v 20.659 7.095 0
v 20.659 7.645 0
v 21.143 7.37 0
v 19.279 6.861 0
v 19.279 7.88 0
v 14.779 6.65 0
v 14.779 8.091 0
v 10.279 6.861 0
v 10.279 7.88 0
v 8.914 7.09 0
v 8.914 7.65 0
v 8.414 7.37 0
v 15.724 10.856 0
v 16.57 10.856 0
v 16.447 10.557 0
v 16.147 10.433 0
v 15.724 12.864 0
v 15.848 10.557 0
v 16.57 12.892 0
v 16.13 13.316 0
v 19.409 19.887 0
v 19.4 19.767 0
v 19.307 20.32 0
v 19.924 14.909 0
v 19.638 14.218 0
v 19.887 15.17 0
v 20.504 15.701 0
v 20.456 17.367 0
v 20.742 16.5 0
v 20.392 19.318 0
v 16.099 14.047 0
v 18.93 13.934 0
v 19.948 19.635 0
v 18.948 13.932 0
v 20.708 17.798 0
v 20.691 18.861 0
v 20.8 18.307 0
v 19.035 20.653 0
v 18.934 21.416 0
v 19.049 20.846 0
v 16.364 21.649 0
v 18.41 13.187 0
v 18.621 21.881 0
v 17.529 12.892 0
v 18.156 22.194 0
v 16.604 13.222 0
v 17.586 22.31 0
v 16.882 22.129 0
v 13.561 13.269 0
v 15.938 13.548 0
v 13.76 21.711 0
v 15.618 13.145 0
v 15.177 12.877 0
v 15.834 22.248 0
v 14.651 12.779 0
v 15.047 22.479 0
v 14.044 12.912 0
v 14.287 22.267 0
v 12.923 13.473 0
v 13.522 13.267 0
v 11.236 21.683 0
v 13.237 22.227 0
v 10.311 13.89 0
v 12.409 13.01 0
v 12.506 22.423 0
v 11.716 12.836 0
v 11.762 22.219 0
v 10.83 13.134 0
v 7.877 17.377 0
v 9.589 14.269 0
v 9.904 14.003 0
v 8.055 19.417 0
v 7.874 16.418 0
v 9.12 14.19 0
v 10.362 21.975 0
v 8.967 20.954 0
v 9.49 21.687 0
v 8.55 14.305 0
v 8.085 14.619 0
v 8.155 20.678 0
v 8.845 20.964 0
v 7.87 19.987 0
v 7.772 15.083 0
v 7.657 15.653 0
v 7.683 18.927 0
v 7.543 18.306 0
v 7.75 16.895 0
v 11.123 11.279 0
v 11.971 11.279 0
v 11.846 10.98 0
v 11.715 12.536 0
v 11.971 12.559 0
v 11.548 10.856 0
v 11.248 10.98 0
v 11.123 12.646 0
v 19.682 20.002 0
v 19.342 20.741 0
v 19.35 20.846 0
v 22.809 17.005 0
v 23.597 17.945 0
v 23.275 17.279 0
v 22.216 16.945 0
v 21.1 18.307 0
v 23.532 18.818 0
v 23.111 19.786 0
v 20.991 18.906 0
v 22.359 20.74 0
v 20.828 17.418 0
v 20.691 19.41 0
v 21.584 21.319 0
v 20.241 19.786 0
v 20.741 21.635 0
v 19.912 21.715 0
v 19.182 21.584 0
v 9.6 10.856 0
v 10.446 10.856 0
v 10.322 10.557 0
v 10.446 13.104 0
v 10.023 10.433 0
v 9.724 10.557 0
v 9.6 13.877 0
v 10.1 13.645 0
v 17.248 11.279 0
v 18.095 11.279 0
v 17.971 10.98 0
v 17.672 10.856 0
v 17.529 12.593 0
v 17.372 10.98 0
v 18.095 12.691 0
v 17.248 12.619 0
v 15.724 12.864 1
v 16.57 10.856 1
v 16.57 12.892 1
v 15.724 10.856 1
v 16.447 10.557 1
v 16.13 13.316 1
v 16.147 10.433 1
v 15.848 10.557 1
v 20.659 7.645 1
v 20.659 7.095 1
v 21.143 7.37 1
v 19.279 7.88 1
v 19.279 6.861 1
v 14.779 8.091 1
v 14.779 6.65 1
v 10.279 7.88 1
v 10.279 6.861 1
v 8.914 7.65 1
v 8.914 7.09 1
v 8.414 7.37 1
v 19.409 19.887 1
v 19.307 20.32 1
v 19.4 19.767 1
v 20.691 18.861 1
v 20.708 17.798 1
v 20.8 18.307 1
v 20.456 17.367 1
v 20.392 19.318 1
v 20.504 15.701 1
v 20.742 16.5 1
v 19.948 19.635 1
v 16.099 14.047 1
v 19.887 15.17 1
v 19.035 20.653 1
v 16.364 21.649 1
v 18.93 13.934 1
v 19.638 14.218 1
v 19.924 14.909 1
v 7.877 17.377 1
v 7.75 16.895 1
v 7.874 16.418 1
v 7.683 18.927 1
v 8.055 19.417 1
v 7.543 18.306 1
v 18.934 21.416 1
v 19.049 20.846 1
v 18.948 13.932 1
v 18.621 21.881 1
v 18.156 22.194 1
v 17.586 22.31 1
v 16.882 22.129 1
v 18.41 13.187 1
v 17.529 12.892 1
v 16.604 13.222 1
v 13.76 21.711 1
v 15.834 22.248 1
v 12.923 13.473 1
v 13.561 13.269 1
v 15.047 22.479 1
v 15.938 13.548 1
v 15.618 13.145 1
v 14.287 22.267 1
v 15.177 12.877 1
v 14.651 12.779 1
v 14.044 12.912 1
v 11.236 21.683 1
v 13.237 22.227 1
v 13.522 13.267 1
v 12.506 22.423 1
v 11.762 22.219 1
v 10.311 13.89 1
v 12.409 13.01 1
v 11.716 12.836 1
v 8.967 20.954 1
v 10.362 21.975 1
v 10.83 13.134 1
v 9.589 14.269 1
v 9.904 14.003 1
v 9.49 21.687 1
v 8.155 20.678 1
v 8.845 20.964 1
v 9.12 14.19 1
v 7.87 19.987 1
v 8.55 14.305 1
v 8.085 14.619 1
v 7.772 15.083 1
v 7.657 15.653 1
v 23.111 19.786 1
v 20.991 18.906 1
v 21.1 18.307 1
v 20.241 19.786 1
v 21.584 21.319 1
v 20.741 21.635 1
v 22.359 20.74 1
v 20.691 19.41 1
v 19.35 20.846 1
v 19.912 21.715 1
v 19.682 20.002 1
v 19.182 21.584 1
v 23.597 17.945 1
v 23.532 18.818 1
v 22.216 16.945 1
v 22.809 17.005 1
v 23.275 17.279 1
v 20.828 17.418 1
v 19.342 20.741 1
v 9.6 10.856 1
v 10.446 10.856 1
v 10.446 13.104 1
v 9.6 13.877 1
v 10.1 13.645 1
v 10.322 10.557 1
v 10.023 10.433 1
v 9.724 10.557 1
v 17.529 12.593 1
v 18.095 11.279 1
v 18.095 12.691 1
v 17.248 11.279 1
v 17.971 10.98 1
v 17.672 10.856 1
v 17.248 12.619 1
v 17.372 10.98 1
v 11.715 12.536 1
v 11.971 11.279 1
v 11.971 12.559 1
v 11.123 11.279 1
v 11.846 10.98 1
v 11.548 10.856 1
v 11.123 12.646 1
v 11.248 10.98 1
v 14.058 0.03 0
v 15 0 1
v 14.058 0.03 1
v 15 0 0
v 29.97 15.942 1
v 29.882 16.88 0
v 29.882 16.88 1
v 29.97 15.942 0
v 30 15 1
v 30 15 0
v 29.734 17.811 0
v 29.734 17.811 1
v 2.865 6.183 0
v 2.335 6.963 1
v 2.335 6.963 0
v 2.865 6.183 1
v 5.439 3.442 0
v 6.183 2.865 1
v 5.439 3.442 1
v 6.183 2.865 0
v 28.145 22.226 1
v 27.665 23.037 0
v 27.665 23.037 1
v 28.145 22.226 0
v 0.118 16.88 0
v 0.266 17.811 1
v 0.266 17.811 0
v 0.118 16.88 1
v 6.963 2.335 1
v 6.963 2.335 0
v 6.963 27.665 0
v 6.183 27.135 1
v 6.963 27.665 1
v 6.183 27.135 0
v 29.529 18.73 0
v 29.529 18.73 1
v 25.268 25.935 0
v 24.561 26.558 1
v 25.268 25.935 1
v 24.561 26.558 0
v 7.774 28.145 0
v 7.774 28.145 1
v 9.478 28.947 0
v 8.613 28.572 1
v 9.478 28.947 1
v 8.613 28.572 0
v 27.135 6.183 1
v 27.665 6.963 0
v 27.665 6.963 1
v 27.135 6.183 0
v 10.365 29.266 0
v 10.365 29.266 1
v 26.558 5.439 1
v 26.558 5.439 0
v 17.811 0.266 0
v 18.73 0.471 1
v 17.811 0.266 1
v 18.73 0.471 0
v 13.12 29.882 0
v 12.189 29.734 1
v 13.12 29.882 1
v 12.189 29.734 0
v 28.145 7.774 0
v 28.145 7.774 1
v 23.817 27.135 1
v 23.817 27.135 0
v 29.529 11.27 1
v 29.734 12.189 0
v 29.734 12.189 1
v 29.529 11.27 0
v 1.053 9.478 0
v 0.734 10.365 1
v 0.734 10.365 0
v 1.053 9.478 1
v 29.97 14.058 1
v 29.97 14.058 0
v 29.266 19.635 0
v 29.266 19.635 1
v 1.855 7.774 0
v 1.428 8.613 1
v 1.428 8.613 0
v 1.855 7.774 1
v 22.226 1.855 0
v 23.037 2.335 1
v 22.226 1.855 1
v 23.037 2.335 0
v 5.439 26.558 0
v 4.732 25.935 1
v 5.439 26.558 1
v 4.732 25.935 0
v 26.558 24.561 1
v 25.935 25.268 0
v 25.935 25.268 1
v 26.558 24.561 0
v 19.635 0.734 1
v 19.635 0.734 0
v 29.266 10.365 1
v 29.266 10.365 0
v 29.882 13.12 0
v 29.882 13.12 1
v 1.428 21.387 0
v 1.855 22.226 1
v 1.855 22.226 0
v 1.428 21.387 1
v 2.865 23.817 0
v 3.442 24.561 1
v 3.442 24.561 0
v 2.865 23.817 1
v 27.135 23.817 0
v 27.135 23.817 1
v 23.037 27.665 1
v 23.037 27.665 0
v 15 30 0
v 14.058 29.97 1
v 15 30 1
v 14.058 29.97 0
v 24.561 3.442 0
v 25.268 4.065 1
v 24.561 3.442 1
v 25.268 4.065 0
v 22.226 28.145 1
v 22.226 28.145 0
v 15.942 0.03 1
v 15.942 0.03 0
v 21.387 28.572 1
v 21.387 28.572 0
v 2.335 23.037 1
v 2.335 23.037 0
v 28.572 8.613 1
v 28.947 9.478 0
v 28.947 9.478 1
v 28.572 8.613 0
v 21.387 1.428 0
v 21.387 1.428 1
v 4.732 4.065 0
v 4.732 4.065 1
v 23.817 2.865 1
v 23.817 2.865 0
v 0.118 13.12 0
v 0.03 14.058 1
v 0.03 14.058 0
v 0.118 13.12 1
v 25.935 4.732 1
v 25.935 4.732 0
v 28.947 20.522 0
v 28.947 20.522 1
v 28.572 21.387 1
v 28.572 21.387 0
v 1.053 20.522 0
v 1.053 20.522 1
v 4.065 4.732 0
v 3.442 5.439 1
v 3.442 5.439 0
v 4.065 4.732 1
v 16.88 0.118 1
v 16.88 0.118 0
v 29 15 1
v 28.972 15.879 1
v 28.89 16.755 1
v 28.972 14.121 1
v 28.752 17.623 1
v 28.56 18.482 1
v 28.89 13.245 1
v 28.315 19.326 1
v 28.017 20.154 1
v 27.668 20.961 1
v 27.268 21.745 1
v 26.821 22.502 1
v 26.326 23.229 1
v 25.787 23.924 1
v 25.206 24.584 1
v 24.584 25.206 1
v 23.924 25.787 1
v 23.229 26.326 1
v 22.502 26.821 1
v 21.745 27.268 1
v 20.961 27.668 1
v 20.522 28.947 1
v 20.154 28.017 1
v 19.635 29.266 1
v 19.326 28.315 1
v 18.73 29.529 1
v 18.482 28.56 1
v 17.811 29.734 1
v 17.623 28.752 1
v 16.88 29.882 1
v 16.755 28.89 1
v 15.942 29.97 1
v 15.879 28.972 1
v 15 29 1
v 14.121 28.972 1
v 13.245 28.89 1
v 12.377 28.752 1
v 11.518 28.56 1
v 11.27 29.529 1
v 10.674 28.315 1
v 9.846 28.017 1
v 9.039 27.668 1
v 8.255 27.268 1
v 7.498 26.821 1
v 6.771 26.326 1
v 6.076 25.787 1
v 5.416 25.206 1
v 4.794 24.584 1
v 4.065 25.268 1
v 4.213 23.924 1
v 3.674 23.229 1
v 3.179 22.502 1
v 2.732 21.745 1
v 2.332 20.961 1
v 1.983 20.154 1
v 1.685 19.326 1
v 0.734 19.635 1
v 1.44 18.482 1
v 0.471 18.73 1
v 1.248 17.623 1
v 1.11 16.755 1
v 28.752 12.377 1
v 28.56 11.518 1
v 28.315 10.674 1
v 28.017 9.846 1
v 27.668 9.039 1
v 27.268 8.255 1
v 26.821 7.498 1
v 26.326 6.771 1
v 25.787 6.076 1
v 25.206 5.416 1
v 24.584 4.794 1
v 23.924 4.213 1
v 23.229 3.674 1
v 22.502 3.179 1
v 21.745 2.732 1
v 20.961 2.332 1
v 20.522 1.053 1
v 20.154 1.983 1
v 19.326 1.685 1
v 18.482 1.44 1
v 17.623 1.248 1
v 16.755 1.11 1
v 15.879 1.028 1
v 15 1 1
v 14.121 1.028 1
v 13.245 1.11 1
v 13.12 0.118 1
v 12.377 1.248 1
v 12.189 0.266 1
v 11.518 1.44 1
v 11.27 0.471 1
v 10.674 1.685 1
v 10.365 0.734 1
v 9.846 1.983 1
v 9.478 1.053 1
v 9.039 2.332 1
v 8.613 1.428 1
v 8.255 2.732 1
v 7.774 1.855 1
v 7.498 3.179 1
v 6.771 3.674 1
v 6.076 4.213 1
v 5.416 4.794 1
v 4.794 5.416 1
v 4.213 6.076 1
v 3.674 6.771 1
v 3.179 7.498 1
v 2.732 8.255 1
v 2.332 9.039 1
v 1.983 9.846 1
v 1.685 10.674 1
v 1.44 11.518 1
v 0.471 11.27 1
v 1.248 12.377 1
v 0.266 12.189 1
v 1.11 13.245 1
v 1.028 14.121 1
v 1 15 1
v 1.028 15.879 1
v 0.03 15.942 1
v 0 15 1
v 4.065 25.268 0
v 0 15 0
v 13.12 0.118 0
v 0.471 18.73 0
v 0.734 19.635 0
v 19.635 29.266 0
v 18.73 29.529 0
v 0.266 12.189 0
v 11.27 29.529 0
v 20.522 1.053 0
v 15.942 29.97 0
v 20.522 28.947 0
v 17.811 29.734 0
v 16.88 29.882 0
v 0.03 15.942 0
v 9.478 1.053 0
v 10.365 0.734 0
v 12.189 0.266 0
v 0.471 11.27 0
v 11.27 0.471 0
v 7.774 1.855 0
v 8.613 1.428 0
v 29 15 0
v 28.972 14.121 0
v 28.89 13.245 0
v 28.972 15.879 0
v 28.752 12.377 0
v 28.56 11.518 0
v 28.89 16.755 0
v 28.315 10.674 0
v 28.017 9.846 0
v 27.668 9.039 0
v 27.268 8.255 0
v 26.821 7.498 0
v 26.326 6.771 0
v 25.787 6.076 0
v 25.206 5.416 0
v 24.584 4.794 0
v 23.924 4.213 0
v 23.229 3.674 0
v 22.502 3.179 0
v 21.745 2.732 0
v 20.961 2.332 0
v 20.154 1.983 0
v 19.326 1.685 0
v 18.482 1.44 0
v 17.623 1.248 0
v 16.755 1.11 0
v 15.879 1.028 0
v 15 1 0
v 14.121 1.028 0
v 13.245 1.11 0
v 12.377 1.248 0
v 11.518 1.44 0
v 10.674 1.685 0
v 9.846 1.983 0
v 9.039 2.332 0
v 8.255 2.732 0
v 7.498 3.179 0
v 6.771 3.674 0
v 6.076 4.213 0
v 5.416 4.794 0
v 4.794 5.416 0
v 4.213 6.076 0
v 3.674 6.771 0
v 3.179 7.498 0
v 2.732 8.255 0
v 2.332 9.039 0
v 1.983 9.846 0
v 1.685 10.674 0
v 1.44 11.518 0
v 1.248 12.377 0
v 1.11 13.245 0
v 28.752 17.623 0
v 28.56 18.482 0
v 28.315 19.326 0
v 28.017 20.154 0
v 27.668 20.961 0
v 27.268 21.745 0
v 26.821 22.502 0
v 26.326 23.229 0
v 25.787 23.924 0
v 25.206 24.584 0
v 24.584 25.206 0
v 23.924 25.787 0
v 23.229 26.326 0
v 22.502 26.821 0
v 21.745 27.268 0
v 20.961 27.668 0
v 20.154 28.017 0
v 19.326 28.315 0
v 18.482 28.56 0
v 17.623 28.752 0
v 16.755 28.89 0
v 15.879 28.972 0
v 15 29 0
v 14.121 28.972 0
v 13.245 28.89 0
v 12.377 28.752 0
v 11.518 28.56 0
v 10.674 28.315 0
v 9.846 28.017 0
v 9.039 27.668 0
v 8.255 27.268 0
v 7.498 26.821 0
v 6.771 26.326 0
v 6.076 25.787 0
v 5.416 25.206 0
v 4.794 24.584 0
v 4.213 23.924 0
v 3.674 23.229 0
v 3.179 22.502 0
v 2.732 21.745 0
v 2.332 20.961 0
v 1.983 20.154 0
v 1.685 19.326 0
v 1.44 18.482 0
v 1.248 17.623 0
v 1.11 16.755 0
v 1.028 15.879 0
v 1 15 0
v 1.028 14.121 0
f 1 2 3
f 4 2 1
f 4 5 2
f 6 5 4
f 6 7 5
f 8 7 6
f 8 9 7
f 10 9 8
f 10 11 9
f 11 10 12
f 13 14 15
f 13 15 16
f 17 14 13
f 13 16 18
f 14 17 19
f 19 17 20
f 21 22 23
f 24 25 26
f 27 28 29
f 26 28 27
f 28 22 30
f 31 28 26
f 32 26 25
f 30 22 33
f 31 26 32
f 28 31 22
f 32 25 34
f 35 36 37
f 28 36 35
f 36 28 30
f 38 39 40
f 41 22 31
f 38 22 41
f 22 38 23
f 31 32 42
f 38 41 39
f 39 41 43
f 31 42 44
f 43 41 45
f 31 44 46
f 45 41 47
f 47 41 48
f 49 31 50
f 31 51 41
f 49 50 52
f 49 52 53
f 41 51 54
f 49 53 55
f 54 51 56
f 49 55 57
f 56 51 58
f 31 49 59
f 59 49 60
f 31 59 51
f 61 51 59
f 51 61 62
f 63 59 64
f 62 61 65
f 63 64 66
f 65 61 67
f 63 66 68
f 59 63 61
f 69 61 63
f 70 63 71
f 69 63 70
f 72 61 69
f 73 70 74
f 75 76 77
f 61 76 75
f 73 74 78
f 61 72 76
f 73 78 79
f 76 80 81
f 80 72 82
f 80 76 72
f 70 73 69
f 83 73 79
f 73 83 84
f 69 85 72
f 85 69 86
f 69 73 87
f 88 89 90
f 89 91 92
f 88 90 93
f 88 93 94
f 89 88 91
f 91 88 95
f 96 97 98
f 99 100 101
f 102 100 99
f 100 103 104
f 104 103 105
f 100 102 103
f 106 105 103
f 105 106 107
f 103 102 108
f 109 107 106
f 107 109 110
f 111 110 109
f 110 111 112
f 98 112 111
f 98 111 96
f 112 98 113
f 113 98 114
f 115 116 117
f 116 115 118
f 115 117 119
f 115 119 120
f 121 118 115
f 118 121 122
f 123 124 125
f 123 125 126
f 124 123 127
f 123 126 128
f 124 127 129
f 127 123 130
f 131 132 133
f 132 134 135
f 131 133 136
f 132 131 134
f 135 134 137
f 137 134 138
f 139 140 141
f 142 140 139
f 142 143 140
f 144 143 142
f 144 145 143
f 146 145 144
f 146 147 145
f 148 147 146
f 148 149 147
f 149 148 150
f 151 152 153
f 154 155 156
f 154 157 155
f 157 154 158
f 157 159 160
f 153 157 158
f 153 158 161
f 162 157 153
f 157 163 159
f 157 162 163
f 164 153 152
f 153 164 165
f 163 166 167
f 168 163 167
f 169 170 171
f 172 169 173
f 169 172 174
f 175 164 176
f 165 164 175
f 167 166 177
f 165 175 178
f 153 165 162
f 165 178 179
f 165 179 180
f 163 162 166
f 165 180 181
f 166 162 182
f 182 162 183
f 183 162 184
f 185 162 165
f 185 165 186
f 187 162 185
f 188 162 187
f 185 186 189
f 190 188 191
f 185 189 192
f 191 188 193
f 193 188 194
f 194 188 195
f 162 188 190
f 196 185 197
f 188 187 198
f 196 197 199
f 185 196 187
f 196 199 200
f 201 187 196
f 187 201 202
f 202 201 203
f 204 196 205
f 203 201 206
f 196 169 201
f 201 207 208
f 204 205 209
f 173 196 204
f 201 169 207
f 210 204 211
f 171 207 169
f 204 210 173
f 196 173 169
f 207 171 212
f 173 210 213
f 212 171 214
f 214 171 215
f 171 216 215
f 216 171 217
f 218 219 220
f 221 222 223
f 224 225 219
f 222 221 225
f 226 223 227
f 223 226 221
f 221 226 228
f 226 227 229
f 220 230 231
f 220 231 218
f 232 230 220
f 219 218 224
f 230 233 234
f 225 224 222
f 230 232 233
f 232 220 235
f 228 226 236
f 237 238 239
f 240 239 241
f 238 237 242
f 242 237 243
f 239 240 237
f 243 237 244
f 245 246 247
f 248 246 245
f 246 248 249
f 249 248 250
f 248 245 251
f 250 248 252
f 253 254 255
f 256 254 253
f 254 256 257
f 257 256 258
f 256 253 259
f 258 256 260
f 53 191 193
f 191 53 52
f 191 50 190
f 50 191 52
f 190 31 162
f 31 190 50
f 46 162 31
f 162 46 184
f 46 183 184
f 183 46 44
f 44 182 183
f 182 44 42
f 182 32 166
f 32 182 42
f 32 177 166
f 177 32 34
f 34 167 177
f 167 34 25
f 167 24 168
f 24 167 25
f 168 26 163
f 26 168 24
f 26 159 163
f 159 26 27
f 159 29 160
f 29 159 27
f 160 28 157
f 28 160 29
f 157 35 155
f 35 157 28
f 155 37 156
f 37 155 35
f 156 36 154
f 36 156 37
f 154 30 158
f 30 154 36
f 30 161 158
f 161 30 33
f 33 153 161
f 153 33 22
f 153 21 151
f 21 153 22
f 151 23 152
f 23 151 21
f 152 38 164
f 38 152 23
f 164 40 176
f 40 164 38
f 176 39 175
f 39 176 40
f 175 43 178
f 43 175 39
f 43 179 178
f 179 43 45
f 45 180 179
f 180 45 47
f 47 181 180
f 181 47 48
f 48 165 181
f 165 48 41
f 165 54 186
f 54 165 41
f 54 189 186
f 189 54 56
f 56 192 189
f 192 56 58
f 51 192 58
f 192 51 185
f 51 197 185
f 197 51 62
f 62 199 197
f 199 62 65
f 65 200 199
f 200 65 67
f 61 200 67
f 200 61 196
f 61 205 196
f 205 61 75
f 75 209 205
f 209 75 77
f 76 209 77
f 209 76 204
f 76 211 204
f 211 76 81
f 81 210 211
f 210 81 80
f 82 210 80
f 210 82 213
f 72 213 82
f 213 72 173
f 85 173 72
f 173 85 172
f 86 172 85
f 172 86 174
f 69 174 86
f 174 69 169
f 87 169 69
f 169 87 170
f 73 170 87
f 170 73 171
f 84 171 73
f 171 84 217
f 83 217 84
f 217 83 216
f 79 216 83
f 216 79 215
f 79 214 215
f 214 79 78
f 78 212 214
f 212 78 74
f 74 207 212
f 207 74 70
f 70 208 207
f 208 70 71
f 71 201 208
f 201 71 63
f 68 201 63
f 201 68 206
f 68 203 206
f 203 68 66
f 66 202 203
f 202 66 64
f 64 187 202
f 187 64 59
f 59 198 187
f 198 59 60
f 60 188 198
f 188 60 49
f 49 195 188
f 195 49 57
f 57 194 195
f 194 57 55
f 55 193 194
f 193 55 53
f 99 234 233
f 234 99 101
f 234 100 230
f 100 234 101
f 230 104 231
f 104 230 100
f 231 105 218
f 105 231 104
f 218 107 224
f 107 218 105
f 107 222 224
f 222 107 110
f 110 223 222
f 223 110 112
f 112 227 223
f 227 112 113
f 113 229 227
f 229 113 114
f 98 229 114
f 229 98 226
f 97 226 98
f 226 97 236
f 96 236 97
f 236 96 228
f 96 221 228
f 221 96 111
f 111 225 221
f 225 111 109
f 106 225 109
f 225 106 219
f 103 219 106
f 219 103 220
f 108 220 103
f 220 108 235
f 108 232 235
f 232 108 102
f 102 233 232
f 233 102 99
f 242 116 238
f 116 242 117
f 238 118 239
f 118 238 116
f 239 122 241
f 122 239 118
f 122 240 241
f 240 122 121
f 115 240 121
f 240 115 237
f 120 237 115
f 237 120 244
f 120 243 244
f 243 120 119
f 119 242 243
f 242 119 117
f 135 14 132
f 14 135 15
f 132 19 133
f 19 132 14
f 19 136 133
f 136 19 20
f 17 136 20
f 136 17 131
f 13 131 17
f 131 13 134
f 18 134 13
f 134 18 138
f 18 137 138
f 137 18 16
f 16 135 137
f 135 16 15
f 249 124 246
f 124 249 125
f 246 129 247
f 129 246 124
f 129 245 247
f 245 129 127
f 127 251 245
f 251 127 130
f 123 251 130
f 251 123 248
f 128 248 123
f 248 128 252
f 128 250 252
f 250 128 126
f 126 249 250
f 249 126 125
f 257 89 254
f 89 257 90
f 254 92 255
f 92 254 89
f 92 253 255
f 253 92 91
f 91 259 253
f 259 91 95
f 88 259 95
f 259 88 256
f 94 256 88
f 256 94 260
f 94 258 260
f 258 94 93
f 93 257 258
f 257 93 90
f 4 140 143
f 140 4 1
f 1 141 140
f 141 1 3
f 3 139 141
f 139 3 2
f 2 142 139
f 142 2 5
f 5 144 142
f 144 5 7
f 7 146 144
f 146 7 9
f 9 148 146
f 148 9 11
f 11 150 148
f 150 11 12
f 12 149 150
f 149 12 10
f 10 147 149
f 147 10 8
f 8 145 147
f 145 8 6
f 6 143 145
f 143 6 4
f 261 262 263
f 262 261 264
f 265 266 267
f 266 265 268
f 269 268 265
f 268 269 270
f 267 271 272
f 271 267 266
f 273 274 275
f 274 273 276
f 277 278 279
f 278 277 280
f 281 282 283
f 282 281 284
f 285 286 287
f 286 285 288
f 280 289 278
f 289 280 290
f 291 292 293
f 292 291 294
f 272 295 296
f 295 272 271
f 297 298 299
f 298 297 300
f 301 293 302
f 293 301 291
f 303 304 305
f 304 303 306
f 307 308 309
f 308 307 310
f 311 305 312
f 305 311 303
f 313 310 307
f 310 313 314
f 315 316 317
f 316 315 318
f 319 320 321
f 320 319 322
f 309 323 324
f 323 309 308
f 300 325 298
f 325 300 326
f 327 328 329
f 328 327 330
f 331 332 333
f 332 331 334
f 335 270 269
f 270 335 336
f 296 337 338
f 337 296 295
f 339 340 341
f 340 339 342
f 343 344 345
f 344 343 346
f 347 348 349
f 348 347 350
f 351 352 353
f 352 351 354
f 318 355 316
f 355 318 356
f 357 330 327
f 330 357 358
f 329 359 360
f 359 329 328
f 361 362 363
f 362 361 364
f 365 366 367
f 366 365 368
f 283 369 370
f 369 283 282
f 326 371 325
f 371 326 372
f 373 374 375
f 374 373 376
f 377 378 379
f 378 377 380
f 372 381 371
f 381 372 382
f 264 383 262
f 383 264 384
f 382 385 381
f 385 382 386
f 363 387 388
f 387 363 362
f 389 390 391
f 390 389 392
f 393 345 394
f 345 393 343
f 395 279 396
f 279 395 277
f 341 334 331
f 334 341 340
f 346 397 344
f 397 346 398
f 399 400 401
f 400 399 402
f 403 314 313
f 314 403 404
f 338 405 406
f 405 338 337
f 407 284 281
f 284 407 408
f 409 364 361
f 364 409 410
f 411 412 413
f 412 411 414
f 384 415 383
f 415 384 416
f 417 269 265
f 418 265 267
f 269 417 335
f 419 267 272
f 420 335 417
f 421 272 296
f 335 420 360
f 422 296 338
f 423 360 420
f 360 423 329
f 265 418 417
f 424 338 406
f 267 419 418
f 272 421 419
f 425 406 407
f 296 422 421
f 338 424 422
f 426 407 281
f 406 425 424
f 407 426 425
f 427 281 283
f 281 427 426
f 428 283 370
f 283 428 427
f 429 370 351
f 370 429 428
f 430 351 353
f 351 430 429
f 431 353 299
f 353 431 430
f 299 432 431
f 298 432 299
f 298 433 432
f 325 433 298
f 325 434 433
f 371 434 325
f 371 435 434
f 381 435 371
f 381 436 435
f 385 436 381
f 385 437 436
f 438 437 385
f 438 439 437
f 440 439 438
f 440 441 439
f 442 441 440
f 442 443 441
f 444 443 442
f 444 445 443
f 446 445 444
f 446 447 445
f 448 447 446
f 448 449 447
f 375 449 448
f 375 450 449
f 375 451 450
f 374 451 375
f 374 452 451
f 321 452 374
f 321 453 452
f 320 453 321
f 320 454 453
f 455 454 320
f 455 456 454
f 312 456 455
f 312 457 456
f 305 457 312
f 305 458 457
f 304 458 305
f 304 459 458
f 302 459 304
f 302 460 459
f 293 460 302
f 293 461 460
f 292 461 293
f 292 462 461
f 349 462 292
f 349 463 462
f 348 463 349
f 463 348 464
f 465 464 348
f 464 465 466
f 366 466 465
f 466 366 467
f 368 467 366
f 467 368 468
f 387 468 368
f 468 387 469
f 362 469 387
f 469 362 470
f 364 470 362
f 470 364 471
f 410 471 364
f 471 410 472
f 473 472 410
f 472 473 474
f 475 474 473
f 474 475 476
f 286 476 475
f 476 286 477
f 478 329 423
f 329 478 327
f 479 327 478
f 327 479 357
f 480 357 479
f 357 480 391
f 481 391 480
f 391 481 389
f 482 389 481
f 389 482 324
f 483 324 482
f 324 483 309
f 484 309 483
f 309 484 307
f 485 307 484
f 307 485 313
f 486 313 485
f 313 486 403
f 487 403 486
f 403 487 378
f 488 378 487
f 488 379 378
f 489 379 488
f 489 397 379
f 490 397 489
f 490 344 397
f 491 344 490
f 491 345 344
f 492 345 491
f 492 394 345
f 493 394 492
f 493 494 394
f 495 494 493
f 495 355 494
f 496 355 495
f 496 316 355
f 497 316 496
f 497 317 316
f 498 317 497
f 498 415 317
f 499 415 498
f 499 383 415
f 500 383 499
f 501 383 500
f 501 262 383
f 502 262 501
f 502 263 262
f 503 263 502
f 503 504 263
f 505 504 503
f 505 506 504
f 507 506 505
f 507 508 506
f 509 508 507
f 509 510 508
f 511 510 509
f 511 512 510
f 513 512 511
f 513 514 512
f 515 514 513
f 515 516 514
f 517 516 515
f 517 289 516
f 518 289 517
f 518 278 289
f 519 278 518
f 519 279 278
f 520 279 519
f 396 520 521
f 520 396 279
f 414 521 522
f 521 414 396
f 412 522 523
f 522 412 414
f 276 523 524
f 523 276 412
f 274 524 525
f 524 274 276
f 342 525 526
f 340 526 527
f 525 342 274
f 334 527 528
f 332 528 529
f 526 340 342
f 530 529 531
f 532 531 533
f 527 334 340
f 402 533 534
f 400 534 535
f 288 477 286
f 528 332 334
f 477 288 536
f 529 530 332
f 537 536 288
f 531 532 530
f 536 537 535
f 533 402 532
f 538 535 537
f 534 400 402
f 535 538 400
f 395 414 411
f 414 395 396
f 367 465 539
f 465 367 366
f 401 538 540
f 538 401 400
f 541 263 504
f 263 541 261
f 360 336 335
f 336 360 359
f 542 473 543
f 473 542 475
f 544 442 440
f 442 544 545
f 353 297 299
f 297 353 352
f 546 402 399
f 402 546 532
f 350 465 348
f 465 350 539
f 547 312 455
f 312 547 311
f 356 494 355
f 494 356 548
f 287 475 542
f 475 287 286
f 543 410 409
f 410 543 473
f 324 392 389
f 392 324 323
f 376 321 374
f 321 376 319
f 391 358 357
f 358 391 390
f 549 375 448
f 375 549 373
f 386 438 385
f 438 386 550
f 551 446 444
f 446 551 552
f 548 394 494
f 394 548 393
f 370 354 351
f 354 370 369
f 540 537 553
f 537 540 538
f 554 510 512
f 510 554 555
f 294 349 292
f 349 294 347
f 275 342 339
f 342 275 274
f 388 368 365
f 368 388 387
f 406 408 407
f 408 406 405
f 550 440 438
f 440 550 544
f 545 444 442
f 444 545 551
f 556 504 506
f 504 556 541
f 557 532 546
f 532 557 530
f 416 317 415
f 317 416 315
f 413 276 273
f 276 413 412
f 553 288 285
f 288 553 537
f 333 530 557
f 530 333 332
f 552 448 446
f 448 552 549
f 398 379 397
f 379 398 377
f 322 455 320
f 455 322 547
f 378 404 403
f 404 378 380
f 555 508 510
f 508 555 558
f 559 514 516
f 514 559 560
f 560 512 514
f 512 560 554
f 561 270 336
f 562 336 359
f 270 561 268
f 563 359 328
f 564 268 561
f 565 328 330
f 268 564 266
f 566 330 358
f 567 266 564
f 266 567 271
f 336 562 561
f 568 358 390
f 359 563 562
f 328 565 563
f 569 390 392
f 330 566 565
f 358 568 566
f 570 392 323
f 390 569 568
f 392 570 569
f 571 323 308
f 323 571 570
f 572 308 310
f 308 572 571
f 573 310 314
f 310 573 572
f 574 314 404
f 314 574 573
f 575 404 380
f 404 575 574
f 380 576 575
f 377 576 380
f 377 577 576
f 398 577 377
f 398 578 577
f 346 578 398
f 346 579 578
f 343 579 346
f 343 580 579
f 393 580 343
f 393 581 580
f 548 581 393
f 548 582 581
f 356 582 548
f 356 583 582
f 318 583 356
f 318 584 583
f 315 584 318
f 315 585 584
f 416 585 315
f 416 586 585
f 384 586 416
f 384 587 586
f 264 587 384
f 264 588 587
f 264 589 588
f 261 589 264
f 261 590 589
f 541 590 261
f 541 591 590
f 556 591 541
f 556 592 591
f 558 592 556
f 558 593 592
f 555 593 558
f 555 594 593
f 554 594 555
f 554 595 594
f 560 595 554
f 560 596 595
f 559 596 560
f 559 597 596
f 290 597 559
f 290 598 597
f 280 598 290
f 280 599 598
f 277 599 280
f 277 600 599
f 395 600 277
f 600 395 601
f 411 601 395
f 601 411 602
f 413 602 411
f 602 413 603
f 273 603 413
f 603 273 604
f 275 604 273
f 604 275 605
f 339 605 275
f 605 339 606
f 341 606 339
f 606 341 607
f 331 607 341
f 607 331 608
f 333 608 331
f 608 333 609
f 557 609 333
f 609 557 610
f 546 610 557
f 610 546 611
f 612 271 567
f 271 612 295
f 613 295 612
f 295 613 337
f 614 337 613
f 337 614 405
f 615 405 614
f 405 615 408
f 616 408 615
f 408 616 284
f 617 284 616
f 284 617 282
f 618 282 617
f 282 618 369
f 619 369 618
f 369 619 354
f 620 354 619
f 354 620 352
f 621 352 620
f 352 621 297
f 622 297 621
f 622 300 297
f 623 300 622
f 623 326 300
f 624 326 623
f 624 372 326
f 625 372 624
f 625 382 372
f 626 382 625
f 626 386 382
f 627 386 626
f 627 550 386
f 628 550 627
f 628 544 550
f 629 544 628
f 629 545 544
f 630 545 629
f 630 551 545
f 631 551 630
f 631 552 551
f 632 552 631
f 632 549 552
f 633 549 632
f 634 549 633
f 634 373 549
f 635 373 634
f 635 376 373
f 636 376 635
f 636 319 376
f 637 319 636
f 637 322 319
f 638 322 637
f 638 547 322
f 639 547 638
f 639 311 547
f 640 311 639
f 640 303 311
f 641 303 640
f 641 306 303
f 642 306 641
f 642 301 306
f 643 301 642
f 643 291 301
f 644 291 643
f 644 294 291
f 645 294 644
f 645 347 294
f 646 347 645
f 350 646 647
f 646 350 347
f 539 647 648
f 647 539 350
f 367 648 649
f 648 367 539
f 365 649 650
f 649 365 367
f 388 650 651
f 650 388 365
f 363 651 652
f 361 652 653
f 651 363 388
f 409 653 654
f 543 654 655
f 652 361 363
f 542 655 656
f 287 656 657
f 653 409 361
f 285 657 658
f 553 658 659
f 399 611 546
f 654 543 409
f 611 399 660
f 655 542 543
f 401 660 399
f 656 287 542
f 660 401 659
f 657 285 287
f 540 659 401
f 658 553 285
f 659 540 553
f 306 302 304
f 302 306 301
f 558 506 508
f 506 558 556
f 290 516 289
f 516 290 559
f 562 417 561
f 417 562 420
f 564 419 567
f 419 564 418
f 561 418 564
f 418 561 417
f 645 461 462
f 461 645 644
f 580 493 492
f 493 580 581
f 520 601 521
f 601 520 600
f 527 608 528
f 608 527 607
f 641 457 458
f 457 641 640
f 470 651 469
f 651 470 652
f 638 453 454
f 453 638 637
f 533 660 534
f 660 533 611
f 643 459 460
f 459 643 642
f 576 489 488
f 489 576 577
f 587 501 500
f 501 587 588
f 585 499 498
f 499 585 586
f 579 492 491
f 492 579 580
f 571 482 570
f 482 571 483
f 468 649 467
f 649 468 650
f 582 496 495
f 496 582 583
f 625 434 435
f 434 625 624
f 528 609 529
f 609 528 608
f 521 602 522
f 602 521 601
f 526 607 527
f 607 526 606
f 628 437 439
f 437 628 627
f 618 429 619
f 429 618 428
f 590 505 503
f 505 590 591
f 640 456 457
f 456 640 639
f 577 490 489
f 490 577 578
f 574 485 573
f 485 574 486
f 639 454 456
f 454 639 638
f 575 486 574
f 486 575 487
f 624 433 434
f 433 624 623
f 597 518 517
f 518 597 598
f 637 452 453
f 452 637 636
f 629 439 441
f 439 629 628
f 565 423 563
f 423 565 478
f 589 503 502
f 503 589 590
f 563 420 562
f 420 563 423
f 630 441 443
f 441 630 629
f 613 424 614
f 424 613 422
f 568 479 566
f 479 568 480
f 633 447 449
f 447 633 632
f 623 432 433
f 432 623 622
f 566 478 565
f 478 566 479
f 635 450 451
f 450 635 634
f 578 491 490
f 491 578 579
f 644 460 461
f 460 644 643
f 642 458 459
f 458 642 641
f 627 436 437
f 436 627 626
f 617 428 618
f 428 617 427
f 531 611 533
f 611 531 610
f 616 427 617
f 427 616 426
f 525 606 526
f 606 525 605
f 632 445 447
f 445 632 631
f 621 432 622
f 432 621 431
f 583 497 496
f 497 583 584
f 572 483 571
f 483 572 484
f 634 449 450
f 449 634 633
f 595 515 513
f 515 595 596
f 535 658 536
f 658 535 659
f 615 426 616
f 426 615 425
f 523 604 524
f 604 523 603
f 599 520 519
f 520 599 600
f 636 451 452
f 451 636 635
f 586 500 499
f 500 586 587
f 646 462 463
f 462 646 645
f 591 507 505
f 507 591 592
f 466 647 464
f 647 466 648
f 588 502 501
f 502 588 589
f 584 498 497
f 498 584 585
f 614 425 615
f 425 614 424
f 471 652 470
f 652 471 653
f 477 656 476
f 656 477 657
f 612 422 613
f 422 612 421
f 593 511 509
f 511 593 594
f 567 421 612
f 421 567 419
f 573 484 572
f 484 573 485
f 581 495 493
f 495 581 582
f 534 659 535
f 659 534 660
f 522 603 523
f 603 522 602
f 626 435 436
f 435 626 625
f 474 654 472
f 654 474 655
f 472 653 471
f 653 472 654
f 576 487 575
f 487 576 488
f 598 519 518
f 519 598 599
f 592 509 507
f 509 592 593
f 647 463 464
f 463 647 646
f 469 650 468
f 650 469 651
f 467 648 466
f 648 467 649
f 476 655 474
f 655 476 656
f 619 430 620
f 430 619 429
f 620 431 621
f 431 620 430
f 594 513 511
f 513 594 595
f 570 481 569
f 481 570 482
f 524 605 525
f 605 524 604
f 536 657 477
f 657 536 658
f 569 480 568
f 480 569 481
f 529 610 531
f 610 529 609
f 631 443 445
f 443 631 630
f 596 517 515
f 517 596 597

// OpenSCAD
/* Floating Sheep Studios Logo */

/* [Base] */
addBase = false;
baseThickness = 0.5;

/* [Dimensions] */
logoWidth = 30;
logoHeight = 1;

/* [Hidden] */
dxfWidth = 25;
$fn = 100;

module logo(w = logoWidth, h = logoHeight) {
  difference() {
    scaleUp = w / dxfWidth;
    linear_extrude(h)
    scale([scaleUp, scaleUp, 0])
    import("fss-logo-img-bw-gaps.dxf");
    
    // delete the ugly rough circle
    translate([w/2, w/2, -1]) difference() {
      cylinder(h=h+2, d=w+2);
      translate([0, 0, -1])
        cylinder(h=h+4, d=w-4);
    }
  }
  
  // add a nicer circle
  translate([w/2, w/2, 0]) difference() {
    cylinder(h=h, d=w);
    translate([0, 0, -1]) cylinder(h=h+2, d=w-2);
  }
}

if (addBase) {
  translate([0, 0, baseThickness]) logo();
  translate([logoWidth/2, logoWidth/2, 0])
    cylinder(h=baseThickness, d=logoWidth);
} else {
  logo();
}
